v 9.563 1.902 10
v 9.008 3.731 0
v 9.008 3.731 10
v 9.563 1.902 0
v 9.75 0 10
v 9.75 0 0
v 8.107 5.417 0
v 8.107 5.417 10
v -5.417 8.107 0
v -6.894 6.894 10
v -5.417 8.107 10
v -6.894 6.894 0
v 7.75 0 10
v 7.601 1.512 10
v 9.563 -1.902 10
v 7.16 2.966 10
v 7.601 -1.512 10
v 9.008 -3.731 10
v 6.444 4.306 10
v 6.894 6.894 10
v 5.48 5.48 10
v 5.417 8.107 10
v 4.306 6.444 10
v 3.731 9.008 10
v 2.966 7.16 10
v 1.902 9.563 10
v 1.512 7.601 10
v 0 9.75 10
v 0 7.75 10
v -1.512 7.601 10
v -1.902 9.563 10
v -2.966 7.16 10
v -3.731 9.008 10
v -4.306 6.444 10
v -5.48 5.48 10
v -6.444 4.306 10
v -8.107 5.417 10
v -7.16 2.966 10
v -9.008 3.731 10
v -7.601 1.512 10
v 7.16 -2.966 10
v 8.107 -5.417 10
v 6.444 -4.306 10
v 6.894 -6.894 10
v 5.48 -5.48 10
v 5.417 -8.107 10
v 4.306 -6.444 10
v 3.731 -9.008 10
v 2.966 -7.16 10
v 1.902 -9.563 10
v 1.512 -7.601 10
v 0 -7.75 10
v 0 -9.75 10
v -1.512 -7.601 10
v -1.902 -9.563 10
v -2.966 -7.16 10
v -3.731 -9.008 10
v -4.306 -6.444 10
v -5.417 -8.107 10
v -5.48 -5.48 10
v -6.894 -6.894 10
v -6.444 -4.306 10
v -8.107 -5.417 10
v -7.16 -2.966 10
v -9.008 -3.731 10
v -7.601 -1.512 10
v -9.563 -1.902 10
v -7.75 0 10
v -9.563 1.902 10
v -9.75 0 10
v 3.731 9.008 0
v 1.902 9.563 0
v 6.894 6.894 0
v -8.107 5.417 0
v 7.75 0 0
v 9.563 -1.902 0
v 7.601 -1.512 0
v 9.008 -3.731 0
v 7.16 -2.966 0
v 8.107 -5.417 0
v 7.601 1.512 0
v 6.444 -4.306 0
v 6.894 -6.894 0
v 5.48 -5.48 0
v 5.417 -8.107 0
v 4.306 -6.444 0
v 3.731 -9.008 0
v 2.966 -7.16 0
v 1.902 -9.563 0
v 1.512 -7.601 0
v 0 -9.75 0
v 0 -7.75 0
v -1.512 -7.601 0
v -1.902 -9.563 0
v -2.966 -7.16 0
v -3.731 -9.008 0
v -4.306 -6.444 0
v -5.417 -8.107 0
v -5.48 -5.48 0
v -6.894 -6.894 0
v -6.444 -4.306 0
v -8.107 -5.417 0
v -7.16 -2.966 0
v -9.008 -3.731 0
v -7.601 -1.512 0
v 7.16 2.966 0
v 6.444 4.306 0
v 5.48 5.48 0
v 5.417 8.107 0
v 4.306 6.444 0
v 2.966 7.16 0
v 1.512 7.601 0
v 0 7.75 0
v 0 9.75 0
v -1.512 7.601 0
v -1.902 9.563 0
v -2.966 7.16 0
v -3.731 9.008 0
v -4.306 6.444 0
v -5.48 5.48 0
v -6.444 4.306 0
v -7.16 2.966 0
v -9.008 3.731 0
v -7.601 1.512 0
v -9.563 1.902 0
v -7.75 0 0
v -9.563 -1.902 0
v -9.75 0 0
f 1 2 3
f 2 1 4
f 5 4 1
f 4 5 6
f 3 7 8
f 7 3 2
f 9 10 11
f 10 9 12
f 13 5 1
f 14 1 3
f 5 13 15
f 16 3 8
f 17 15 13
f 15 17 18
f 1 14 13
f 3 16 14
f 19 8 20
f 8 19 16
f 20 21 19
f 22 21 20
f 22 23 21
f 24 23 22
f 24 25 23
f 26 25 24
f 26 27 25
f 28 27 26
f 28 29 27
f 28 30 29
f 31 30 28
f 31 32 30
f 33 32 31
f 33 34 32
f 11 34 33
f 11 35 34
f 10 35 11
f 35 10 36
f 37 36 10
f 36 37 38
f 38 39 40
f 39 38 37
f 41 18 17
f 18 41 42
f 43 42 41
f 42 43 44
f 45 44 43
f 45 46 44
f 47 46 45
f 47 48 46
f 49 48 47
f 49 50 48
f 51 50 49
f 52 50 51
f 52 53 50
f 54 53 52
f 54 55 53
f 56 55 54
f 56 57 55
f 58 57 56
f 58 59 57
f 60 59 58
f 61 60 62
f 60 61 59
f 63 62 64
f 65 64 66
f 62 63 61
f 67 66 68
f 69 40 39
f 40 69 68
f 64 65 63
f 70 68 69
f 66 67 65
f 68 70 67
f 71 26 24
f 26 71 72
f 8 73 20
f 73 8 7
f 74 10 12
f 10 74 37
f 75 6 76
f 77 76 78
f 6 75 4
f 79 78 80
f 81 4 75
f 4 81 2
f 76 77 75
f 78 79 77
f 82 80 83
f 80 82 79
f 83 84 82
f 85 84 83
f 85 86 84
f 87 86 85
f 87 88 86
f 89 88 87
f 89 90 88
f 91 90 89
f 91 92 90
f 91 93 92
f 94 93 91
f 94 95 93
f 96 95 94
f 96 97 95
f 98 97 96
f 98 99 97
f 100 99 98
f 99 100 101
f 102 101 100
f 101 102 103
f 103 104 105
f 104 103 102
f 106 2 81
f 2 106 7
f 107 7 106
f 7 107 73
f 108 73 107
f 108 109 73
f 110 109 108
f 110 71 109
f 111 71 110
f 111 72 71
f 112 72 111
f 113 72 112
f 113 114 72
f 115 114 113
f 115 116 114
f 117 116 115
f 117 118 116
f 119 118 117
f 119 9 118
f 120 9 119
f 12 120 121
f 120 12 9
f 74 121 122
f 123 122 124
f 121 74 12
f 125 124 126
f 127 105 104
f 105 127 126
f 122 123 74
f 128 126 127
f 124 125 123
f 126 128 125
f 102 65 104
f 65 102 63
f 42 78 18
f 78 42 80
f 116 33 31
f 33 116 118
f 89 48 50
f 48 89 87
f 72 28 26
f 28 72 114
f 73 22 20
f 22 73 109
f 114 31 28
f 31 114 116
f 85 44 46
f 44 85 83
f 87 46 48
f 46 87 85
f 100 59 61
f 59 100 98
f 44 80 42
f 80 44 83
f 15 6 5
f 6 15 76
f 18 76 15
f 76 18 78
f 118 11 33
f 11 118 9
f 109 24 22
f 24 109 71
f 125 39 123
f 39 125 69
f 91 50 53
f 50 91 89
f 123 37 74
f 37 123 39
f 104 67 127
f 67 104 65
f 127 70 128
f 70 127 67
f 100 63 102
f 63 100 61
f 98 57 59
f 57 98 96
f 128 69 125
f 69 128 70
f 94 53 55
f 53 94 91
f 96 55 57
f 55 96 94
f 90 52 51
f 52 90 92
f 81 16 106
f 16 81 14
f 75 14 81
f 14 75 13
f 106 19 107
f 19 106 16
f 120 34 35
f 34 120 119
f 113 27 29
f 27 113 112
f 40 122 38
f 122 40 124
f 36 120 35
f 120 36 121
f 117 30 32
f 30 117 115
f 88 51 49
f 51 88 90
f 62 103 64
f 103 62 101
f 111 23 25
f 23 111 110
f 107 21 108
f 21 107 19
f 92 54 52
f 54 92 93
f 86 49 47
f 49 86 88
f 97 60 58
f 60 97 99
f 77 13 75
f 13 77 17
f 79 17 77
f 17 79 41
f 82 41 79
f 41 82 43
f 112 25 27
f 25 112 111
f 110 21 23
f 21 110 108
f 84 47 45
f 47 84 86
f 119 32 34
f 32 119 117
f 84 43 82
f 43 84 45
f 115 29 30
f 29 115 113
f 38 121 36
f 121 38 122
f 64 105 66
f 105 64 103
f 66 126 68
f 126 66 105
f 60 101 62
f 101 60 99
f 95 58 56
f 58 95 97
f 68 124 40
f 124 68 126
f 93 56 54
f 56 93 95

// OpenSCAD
$fn = 32;

// ----------------------------------------------------------------------
// Spacer sleeve: 19.5 / 15.5 x 10 mm
// ----------------------------------------------------------------------

// --- parameters (mm) ---
outer_d = 19.5;           // outside diameter
inner_d = 15.5;           // shaft bore
length = 10;              // sleeve length

module sleeve() {
  cylinder(h = length, d = outer_d);
}

difference() {
  sleeve();
  translate([0, 0, -1]) cylinder(h = length + 2, d = inner_d);
}
